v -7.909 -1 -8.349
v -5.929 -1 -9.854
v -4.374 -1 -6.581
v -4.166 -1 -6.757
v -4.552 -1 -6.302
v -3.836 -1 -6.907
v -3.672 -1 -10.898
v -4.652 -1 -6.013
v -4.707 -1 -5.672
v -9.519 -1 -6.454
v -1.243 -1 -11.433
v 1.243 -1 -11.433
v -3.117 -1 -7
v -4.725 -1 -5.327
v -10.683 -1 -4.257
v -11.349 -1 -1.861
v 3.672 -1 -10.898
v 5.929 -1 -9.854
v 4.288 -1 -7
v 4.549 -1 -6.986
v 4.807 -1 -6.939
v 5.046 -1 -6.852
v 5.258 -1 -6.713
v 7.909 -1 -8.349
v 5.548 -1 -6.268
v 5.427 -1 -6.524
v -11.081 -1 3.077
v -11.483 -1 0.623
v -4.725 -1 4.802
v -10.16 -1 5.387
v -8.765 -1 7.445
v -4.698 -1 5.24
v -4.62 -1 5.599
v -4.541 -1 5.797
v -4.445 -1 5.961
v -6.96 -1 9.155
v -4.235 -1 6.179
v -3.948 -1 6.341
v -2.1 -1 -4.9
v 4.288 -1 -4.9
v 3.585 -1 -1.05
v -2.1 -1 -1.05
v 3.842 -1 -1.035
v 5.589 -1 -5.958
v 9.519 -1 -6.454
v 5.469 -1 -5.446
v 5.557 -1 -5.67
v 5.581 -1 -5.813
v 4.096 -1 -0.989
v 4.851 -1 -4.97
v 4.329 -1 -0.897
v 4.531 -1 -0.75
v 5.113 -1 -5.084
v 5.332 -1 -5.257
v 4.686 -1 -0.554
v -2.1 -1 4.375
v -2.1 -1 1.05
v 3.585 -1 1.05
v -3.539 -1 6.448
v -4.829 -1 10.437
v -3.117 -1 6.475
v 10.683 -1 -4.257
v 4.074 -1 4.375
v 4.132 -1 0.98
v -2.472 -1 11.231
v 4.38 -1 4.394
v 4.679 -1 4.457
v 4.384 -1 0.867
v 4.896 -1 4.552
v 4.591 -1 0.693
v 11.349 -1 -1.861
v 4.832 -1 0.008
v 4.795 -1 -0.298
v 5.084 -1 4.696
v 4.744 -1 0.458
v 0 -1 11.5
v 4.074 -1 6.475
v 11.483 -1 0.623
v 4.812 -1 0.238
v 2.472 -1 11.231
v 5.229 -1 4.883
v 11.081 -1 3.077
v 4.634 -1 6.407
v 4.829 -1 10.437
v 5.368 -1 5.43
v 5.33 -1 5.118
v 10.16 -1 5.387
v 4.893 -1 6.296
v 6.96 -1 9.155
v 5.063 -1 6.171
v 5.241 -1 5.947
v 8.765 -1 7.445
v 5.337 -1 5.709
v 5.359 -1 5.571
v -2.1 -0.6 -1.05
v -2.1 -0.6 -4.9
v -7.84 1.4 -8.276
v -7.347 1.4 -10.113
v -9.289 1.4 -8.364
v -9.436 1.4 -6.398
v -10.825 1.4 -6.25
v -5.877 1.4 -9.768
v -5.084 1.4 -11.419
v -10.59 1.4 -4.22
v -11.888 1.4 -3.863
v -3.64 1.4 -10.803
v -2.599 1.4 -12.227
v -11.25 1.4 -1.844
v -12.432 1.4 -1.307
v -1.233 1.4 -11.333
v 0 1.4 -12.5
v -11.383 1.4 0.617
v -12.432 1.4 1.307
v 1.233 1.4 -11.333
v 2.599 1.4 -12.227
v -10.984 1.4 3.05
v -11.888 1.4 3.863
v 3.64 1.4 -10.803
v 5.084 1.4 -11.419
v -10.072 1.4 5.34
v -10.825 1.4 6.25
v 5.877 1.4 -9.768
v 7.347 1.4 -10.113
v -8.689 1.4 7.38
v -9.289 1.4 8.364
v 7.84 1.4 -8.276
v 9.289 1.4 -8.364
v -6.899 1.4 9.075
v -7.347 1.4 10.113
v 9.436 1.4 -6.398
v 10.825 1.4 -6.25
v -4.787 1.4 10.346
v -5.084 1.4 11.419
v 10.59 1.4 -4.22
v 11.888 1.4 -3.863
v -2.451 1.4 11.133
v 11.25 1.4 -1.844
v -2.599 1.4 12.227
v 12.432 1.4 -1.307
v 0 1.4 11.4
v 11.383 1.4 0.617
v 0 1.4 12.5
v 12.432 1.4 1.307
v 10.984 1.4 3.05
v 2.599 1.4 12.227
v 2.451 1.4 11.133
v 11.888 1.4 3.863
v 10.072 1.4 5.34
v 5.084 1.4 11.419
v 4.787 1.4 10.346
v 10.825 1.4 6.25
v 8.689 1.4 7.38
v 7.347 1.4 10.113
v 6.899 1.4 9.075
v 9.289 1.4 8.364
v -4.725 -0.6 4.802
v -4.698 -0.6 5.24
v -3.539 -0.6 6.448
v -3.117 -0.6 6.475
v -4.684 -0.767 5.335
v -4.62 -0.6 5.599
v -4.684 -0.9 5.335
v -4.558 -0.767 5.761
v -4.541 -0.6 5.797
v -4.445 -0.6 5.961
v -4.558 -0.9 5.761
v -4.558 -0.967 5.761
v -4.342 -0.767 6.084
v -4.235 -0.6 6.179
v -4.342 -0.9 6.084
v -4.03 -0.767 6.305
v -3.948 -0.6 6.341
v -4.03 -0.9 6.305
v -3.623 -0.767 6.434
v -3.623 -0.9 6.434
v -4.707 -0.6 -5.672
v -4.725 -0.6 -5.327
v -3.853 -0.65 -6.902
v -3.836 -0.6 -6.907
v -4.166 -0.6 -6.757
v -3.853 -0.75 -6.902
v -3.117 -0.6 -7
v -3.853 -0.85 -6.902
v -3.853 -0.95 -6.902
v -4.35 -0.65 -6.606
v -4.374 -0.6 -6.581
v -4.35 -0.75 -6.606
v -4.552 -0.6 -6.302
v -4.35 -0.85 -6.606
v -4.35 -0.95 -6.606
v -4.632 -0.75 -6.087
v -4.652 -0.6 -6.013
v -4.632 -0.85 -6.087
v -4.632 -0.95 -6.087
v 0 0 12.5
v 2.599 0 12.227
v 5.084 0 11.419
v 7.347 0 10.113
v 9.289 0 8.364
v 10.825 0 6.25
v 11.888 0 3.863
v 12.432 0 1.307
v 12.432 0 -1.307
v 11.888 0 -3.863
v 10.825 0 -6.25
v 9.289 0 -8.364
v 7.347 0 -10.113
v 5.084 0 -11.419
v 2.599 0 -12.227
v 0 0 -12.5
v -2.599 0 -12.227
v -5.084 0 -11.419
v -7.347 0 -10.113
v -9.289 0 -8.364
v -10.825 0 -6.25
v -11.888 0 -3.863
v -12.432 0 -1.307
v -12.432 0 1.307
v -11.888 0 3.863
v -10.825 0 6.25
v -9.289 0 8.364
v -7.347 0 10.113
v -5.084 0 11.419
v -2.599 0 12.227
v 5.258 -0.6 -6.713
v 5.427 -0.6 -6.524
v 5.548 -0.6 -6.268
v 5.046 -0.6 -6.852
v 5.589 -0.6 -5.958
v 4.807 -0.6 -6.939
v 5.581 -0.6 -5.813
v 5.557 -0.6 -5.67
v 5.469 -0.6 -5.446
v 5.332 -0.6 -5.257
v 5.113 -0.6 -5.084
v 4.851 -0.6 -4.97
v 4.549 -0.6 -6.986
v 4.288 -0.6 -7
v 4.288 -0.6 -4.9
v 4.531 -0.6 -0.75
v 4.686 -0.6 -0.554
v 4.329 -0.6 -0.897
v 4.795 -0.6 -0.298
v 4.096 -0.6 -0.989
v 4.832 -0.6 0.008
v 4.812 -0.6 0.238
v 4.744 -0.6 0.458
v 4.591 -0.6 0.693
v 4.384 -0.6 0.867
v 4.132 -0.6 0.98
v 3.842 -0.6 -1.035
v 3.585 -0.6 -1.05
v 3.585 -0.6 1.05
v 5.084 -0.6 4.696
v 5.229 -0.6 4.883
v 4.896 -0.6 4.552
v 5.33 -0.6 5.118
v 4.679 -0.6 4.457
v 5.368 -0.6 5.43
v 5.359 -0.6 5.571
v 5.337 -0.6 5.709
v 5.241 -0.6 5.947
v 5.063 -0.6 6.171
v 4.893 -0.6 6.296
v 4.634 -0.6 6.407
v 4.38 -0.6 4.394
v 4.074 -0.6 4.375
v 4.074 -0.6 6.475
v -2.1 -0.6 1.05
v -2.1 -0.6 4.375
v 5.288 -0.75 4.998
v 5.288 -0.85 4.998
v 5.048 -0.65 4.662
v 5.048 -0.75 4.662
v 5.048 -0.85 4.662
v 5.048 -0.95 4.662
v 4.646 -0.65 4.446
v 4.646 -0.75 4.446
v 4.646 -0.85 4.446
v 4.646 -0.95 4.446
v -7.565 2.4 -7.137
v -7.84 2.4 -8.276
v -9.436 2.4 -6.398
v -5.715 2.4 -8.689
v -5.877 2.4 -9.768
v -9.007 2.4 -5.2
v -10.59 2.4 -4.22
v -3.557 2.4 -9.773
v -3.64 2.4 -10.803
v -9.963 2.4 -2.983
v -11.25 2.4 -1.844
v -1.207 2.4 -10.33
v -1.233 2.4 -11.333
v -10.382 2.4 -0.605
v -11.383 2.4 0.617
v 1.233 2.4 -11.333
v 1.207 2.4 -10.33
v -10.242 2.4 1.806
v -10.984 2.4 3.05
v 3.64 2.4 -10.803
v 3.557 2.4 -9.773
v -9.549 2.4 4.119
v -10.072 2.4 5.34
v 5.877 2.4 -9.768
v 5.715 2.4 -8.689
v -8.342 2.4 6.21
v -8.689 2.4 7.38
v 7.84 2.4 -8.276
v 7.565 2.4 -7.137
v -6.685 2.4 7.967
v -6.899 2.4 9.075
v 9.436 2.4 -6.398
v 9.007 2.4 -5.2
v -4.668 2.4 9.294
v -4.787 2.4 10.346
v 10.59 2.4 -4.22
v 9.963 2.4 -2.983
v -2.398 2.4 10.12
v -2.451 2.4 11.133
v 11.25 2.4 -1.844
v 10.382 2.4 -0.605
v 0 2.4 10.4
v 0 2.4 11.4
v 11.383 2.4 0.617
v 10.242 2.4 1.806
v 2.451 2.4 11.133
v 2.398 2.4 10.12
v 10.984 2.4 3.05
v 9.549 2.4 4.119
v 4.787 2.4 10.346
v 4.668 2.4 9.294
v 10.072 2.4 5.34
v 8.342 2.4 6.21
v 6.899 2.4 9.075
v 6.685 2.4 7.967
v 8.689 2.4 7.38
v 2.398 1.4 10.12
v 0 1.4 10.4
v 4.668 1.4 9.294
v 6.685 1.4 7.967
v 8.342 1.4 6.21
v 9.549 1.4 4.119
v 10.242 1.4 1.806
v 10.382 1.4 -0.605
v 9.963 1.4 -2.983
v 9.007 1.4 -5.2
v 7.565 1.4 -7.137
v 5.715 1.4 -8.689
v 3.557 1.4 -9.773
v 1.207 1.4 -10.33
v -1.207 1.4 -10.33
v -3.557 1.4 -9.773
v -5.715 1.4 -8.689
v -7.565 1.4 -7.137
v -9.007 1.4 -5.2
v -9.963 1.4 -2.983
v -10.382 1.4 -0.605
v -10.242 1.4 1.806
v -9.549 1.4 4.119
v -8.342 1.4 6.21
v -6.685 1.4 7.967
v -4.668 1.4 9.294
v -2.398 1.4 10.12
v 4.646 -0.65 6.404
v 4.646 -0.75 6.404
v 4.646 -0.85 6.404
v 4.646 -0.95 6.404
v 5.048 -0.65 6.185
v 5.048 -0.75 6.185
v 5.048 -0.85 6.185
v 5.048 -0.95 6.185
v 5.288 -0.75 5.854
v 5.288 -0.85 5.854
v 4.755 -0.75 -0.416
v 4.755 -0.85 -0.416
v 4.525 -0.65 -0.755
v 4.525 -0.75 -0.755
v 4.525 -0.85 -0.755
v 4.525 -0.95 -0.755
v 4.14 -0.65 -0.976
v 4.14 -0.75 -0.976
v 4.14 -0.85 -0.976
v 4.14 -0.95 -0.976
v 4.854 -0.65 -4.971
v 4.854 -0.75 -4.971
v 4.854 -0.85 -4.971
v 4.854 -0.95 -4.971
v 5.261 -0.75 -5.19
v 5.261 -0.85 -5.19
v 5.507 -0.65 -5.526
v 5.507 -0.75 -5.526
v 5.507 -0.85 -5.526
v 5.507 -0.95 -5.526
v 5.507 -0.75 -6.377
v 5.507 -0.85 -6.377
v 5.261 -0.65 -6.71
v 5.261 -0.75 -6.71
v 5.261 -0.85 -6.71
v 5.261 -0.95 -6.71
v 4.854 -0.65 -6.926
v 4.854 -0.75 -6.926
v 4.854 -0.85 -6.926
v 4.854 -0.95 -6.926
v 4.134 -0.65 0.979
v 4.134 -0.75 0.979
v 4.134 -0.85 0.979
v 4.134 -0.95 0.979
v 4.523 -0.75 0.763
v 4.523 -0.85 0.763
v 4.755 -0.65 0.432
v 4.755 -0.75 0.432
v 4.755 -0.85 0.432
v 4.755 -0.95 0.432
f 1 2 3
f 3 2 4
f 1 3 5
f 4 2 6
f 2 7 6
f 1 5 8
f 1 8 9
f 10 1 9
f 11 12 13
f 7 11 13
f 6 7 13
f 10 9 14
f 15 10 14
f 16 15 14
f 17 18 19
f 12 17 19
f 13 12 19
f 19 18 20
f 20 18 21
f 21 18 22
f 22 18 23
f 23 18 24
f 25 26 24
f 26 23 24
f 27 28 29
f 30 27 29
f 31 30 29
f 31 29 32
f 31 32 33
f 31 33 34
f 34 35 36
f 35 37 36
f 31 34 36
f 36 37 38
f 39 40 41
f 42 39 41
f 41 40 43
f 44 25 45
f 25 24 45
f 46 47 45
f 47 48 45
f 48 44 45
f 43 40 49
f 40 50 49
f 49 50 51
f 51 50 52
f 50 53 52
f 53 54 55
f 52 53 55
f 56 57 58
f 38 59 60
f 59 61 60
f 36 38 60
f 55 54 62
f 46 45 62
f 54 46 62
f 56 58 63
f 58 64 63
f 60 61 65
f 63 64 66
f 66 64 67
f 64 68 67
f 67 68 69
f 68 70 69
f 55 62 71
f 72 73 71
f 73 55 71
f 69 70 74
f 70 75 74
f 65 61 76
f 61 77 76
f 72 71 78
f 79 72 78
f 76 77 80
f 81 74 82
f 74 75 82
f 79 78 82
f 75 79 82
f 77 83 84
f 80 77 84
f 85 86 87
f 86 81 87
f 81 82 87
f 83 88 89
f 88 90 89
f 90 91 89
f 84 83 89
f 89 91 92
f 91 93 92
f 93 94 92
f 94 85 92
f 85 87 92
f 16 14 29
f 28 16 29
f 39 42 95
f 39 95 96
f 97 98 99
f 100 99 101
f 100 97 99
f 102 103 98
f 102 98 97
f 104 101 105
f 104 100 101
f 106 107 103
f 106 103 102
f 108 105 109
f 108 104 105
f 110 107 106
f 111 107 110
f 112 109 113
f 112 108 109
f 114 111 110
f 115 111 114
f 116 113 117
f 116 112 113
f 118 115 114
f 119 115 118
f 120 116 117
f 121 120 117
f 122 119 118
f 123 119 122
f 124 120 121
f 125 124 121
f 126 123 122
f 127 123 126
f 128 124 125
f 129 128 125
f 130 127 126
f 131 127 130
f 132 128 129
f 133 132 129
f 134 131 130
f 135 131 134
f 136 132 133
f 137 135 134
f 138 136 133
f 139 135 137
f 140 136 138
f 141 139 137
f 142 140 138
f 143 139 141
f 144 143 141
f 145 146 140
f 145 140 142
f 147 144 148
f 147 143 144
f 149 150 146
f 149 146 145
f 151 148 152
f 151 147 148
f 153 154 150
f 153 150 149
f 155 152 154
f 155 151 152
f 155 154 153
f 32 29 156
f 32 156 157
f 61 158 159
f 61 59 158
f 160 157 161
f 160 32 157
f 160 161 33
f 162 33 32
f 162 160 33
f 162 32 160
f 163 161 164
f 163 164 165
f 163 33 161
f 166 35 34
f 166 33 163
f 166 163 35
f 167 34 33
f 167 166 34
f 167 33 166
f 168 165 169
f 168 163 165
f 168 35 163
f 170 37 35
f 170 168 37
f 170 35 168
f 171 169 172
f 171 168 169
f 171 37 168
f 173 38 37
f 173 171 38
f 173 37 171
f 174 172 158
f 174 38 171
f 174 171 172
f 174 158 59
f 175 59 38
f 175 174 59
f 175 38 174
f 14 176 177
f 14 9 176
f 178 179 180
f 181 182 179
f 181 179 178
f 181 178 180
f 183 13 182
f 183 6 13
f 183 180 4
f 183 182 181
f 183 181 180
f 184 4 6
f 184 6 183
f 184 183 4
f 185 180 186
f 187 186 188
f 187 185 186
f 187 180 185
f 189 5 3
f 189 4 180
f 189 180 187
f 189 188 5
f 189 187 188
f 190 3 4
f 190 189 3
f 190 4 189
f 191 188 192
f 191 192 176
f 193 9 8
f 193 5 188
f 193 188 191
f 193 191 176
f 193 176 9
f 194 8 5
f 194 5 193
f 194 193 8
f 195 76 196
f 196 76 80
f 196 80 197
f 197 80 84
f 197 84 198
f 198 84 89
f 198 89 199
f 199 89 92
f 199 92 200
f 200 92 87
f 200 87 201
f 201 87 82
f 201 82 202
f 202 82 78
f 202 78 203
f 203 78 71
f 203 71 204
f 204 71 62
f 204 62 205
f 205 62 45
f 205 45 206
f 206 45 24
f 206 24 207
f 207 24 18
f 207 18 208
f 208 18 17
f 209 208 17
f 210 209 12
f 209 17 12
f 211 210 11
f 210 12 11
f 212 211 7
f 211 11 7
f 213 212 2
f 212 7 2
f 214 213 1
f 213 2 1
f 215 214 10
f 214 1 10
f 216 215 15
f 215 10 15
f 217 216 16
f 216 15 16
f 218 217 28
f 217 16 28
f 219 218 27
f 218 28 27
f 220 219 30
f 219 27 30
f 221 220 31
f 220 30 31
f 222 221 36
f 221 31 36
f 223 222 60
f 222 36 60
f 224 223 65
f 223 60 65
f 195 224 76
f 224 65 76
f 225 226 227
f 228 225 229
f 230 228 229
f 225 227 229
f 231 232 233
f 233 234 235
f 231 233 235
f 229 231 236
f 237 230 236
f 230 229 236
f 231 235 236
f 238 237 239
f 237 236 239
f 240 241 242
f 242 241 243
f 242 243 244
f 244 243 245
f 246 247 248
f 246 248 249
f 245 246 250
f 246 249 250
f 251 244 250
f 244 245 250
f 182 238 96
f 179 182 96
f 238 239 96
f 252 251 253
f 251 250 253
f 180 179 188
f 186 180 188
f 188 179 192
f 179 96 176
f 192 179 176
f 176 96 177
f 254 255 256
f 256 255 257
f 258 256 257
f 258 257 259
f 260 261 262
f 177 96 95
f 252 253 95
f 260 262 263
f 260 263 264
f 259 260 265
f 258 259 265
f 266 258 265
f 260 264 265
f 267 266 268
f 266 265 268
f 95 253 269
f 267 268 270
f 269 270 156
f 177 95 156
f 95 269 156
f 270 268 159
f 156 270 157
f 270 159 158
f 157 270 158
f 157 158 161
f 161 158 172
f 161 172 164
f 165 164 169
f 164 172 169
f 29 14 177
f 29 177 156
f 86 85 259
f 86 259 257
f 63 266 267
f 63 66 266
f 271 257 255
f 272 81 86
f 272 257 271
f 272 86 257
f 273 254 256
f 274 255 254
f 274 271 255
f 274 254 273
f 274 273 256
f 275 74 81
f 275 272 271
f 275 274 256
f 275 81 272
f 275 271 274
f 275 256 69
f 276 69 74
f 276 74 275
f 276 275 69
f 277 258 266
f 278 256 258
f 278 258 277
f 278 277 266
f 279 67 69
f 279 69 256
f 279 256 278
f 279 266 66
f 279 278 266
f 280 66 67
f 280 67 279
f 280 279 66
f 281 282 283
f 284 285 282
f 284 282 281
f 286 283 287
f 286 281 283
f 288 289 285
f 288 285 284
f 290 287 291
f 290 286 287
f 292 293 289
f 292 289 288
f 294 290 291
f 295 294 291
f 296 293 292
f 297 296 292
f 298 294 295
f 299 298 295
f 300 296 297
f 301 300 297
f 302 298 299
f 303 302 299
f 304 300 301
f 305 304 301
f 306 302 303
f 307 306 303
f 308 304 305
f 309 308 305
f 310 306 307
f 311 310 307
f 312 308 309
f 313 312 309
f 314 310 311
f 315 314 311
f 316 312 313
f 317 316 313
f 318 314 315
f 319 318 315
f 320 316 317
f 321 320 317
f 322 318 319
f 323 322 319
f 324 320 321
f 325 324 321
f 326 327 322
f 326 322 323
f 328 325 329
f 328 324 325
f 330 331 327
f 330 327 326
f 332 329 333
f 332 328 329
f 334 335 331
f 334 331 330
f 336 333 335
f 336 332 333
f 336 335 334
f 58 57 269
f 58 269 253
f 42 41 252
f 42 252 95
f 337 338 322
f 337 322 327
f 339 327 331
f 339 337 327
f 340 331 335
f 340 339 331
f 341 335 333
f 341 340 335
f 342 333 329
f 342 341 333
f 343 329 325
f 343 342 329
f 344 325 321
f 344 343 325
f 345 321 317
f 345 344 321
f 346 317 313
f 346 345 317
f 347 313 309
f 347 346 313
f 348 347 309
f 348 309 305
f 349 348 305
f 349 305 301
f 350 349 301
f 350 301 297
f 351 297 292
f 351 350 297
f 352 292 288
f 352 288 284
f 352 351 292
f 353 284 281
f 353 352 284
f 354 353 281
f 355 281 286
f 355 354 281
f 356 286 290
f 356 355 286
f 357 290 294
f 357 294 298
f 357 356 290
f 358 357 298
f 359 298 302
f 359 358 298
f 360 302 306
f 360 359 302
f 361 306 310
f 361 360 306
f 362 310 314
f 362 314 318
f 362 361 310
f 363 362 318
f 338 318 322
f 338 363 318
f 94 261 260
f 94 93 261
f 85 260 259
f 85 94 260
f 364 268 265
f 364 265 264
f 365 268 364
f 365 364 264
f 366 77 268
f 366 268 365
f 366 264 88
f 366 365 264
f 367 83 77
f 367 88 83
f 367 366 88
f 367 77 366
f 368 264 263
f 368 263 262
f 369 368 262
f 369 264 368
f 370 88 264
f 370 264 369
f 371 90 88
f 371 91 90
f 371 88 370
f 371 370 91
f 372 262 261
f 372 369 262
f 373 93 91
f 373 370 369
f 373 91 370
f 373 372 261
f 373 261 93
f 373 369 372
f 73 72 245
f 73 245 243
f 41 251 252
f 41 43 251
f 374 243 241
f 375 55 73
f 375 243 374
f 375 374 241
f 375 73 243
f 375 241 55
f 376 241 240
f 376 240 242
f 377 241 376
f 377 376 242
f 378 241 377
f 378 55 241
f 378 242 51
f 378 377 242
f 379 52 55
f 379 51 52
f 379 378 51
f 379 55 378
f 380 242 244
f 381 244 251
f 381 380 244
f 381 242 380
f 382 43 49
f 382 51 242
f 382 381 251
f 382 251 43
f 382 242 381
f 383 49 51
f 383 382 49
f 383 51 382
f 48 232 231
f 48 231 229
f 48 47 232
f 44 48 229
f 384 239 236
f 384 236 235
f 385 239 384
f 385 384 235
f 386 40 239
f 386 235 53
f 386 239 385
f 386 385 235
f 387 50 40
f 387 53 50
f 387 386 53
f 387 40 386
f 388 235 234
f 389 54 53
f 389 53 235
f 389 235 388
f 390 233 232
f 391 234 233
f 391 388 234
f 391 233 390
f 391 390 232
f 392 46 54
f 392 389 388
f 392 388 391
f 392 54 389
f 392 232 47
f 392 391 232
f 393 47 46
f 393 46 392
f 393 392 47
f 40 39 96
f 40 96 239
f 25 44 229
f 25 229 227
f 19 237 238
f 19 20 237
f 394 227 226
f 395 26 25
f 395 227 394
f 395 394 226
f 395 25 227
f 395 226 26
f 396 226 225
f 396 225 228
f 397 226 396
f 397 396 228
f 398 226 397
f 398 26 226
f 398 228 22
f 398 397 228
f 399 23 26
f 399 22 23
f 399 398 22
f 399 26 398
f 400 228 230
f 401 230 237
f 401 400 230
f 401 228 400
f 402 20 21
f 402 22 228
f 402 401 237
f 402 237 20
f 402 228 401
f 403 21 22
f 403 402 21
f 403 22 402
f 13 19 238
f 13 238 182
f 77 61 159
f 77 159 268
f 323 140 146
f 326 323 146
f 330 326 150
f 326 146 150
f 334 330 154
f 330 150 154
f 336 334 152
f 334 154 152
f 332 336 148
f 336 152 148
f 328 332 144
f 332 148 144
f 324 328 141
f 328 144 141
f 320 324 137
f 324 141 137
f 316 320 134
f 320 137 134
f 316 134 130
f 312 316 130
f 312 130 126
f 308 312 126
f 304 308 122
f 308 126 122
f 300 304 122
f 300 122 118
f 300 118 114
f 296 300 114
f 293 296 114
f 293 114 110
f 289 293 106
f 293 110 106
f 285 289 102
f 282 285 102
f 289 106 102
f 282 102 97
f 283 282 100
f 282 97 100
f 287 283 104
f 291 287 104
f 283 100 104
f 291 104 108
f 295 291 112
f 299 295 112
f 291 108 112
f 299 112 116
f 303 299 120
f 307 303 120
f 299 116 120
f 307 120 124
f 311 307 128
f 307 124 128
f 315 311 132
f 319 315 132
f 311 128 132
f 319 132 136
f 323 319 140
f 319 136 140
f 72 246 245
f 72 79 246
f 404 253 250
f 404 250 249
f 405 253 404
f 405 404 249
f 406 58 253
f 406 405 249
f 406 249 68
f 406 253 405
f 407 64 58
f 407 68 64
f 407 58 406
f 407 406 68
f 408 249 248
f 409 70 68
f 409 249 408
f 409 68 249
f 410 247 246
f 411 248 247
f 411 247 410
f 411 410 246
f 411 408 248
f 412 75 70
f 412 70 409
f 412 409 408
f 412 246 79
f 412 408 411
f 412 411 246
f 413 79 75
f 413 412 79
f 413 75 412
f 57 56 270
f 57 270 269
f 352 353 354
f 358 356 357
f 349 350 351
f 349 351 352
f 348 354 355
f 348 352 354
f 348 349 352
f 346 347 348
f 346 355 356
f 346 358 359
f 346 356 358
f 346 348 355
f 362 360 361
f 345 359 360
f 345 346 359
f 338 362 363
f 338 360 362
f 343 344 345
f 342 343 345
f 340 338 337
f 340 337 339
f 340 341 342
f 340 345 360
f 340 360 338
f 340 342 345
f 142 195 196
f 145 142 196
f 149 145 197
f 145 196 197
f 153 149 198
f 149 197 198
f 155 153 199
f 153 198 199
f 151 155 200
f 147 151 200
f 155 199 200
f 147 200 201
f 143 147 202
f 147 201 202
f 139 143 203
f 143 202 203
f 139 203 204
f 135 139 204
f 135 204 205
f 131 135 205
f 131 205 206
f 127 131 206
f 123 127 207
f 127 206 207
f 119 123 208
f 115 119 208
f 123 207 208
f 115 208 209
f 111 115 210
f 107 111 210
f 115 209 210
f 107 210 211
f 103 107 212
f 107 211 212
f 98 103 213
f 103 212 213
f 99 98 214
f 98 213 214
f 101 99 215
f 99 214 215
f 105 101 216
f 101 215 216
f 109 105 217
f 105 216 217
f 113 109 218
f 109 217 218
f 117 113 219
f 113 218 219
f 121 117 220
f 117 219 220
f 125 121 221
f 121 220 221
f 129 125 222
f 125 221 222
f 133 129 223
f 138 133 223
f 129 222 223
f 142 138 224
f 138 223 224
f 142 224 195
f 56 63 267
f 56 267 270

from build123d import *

# Parameters (mm, degrees)
BOSS_EXTRUDE1_DEPTH      = 1.4
BOSS_EXTRUDE1_DEPTH_BACK = 1
SKETCH1_R                = 12.5
SKETCH2_R                = 11.4
SKETCH2_R_2              = 10.4
BOSS_EXTRUDE2_DEPTH      = 1
CHAMFER1_SIZE            = 1
CUT_EXTRUDE6_DEPTH       = 0.4


with BuildPart() as part:
    # Sketch1 → Boss-Extrude1 (new, two sides: drawn at the far end of the back side and taken through both)
    with BuildSketch(Plane(origin=(0, 0, 0), x_dir=(1, 0, 0), z_dir=(0, 1, 0)).offset(-BOSS_EXTRUDE1_DEPTH_BACK)):
        with Locations(Location((0, 0, 0), (0, 0, 270))):
            Circle(SKETCH1_R)
    extrude(amount=BOSS_EXTRUDE1_DEPTH + BOSS_EXTRUDE1_DEPTH_BACK)

    # Sketch2 → Boss-Extrude2 (add)
    with BuildSketch(Plane(origin=(0, 1.4, 0), x_dir=(1, 0, 0), z_dir=(0, 1, 0))):
        with Locations(Location((0, 0, 0), (0, 0, 270))):
            Circle(SKETCH2_R)
        with Locations(Location((0, 0, 0), (0, 0, 270))):
            Circle(SKETCH2_R_2, mode=Mode.SUBTRACT)
    extrude(amount=BOSS_EXTRUDE2_DEPTH)

    # Chamfer1
    chamfer1_edges = [part.edges().sort_by_distance(p)[0] for p in [
        (0, -1, -12.5),
    ]]
    chamfer(chamfer1_edges, length=CHAMFER1_SIZE - 0.0001)  # a hair under: the kernel refuses the full size

    # Sketch8 → Cut-Extrude6 (cut)
    with BuildSketch(Plane.XZ.offset(1)):
        with BuildLine():
            Line((4.07421875, 4.375), (-2.1, 4.375))
            Line((-2.1, 4.375), (-2.1, 1.05))
            Line((-2.1, 1.05), (3.584765625, 1.05))
            add(Edge.make_bspline(
                [(3.584765625, 1.05), (3.683414496, 1.046266561), (3.868584149, 1.03925868), (4.127786585, 0.989689139), (4.346999538, 0.898706669), (4.525338462, 0.771743669), (4.662303563, 0.613832259), (4.762986434, 0.433813713), (4.821847618, 0.22778939), (4.828290287, 0.083326956), (4.831640625, 0.008203125)],
                knots=[0, 0, 0, 0, 1.285293232, 2.412569968, 3.418386025, 4.354403319, 5.23810445, 6.120527863, 7.022630715, 8, 8, 8, 8], degree=3))
            add(Edge.make_bspline(
                [(4.831640625, 0.008203125), (4.828384414, -0.066966736), (4.82212275, -0.211517688), (4.761888965, -0.417277321), (4.664922704, -0.60107826), (4.529268349, -0.762310942), (4.352406057, -0.893955903), (4.132637348, -0.987206532), (3.871609167, -1.039986965), (3.684368347, -1.046523103), (3.584765625, -1.05)],
                knots=[0, 0, 0, 0, 0.971200242, 1.867609123, 2.749214551, 3.645234956, 4.57279535, 5.576919765, 6.711042891, 8, 8, 8, 8], degree=3))
            Line((3.584765625, -1.05), (-2.1, -1.05))
            Line((-2.1, -1.05), (-2.1, -4.9))
            Line((-2.1, -4.9), (4.2875, -4.9))
            add(Edge.make_bspline(
                [(4.2875, -4.9), (4.388861848, -4.903792751), (4.579411283, -4.910922716), (4.847992302, -4.960158814), (5.075597112, -5.053685525), (5.263543825, -5.181722918), (5.412072035, -5.338872712), (5.514235934, -5.525740129), (5.58059817, -5.734099342), (5.586185244, -5.882024152), (5.5890625, -5.958203125)],
                knots=[0, 0, 0, 0, 1.281412047, 2.408917619, 3.431661904, 4.368016538, 5.264760761, 6.136510243, 7.040331808, 8, 8, 8, 8], degree=3))
            add(Edge.make_bspline(
                [(5.5890625, -5.958203125), (5.58633538, -6.032618077), (5.581072924, -6.176214785), (5.513038458, -6.378588348), (5.411333521, -6.561610493), (5.26351397, -6.718079765), (5.076230138, -6.847091674), (4.84693188, -6.935464254), (4.579917838, -6.99038683), (4.388974679, -6.996664043), (4.2875, -7)],
                knots=[0, 0, 0, 0, 0.944744106, 1.823049547, 2.692159438, 3.596595969, 4.540982691, 5.5681055, 6.707595947, 8, 8, 8, 8], degree=3))
            Line((4.2875, -7), (-3.1171875, -7))
            add(Edge.make_bspline(
                [(-3.1171875, -7), (-3.250668685, -6.996115514), (-3.499062513, -6.988886912), (-3.843210801, -6.9154574), (-4.13006517, -6.794002261), (-4.361921166, -6.615323708), (-4.529538591, -6.372693255), (-4.646563385, -6.075591851), (-4.711828234, -5.719439126), (-4.720407168, -5.463553728), (-4.725, -5.3265625)],
                knots=[0, 0, 0, 0, 1.189456171, 2.21344733, 3.119993849, 3.948013107, 4.78741338, 5.71757596, 6.778077714, 8, 8, 8, 8], degree=3))
            Line((-4.725, -5.3265625), (-4.725, 4.8015625))
            add(Edge.make_bspline(
                [(-4.725, 4.8015625), (-4.722897792, 4.895529375), (-4.718905933, 5.073961966), (-4.689215801, 5.328670238), (-4.638698759, 5.55670946), (-4.564380189, 5.759131594), (-4.469499051, 5.937304781), (-4.346451413, 6.088099292), (-4.199394628, 6.212046955), (-4.029553563, 6.312609172), (-3.834457239, 6.384510805), (-3.617609334, 6.440451749), (-3.374933573, 6.468369986), (-3.205653623, 6.472724382), (-3.1171875, 6.475)],
                knots=[0, 0, 0, 0, 1.257097402, 2.387087425, 3.425508426, 4.374733264, 5.264346199, 6.113849079, 6.961774747, 7.825601221, 8.740599092, 9.73444991, 10.816017894, 12, 12, 12, 12], degree=3))
            Line((-3.1171875, 6.475), (4.07421875, 6.475))
            add(Edge.make_bspline(
                [(4.07421875, 6.475), (4.176457481, 6.471126765), (4.368749199, 6.463841942), (4.638739507, 6.415846948), (4.864876279, 6.321013969), (5.050994869, 6.19434625), (5.190969541, 6.034918564), (5.297302215, 5.855179123), (5.35773805, 5.64934083), (5.364242009, 5.504673744), (5.367578125, 5.43046875)],
                knots=[0, 0, 0, 0, 1.304353081, 2.453241492, 3.474309848, 4.409392115, 5.298405909, 6.157667996, 7.055001114, 8, 8, 8, 8], degree=3))
            add(Edge.make_bspline(
                [(5.367578125, 5.43046875), (5.364372303, 5.354401915), (5.358158277, 5.206957264), (5.296483306, 4.997297579), (5.192779923, 4.813069646), (5.050706318, 4.653232754), (4.865555272, 4.525627798), (4.637979495, 4.435054103), (4.368875398, 4.385865259), (4.176501287, 4.378771597), (4.07421875, 4.375)],
                knots=[0, 0, 0, 0, 0.962139494, 1.864969442, 2.738963821, 3.622448103, 4.551714319, 5.562017248, 6.70375977, 8, 8, 8, 8], degree=3))
        make_face()
    extrude(amount=-CUT_EXTRUDE6_DEPTH, mode=Mode.SUBTRACT)


solid = part.part
